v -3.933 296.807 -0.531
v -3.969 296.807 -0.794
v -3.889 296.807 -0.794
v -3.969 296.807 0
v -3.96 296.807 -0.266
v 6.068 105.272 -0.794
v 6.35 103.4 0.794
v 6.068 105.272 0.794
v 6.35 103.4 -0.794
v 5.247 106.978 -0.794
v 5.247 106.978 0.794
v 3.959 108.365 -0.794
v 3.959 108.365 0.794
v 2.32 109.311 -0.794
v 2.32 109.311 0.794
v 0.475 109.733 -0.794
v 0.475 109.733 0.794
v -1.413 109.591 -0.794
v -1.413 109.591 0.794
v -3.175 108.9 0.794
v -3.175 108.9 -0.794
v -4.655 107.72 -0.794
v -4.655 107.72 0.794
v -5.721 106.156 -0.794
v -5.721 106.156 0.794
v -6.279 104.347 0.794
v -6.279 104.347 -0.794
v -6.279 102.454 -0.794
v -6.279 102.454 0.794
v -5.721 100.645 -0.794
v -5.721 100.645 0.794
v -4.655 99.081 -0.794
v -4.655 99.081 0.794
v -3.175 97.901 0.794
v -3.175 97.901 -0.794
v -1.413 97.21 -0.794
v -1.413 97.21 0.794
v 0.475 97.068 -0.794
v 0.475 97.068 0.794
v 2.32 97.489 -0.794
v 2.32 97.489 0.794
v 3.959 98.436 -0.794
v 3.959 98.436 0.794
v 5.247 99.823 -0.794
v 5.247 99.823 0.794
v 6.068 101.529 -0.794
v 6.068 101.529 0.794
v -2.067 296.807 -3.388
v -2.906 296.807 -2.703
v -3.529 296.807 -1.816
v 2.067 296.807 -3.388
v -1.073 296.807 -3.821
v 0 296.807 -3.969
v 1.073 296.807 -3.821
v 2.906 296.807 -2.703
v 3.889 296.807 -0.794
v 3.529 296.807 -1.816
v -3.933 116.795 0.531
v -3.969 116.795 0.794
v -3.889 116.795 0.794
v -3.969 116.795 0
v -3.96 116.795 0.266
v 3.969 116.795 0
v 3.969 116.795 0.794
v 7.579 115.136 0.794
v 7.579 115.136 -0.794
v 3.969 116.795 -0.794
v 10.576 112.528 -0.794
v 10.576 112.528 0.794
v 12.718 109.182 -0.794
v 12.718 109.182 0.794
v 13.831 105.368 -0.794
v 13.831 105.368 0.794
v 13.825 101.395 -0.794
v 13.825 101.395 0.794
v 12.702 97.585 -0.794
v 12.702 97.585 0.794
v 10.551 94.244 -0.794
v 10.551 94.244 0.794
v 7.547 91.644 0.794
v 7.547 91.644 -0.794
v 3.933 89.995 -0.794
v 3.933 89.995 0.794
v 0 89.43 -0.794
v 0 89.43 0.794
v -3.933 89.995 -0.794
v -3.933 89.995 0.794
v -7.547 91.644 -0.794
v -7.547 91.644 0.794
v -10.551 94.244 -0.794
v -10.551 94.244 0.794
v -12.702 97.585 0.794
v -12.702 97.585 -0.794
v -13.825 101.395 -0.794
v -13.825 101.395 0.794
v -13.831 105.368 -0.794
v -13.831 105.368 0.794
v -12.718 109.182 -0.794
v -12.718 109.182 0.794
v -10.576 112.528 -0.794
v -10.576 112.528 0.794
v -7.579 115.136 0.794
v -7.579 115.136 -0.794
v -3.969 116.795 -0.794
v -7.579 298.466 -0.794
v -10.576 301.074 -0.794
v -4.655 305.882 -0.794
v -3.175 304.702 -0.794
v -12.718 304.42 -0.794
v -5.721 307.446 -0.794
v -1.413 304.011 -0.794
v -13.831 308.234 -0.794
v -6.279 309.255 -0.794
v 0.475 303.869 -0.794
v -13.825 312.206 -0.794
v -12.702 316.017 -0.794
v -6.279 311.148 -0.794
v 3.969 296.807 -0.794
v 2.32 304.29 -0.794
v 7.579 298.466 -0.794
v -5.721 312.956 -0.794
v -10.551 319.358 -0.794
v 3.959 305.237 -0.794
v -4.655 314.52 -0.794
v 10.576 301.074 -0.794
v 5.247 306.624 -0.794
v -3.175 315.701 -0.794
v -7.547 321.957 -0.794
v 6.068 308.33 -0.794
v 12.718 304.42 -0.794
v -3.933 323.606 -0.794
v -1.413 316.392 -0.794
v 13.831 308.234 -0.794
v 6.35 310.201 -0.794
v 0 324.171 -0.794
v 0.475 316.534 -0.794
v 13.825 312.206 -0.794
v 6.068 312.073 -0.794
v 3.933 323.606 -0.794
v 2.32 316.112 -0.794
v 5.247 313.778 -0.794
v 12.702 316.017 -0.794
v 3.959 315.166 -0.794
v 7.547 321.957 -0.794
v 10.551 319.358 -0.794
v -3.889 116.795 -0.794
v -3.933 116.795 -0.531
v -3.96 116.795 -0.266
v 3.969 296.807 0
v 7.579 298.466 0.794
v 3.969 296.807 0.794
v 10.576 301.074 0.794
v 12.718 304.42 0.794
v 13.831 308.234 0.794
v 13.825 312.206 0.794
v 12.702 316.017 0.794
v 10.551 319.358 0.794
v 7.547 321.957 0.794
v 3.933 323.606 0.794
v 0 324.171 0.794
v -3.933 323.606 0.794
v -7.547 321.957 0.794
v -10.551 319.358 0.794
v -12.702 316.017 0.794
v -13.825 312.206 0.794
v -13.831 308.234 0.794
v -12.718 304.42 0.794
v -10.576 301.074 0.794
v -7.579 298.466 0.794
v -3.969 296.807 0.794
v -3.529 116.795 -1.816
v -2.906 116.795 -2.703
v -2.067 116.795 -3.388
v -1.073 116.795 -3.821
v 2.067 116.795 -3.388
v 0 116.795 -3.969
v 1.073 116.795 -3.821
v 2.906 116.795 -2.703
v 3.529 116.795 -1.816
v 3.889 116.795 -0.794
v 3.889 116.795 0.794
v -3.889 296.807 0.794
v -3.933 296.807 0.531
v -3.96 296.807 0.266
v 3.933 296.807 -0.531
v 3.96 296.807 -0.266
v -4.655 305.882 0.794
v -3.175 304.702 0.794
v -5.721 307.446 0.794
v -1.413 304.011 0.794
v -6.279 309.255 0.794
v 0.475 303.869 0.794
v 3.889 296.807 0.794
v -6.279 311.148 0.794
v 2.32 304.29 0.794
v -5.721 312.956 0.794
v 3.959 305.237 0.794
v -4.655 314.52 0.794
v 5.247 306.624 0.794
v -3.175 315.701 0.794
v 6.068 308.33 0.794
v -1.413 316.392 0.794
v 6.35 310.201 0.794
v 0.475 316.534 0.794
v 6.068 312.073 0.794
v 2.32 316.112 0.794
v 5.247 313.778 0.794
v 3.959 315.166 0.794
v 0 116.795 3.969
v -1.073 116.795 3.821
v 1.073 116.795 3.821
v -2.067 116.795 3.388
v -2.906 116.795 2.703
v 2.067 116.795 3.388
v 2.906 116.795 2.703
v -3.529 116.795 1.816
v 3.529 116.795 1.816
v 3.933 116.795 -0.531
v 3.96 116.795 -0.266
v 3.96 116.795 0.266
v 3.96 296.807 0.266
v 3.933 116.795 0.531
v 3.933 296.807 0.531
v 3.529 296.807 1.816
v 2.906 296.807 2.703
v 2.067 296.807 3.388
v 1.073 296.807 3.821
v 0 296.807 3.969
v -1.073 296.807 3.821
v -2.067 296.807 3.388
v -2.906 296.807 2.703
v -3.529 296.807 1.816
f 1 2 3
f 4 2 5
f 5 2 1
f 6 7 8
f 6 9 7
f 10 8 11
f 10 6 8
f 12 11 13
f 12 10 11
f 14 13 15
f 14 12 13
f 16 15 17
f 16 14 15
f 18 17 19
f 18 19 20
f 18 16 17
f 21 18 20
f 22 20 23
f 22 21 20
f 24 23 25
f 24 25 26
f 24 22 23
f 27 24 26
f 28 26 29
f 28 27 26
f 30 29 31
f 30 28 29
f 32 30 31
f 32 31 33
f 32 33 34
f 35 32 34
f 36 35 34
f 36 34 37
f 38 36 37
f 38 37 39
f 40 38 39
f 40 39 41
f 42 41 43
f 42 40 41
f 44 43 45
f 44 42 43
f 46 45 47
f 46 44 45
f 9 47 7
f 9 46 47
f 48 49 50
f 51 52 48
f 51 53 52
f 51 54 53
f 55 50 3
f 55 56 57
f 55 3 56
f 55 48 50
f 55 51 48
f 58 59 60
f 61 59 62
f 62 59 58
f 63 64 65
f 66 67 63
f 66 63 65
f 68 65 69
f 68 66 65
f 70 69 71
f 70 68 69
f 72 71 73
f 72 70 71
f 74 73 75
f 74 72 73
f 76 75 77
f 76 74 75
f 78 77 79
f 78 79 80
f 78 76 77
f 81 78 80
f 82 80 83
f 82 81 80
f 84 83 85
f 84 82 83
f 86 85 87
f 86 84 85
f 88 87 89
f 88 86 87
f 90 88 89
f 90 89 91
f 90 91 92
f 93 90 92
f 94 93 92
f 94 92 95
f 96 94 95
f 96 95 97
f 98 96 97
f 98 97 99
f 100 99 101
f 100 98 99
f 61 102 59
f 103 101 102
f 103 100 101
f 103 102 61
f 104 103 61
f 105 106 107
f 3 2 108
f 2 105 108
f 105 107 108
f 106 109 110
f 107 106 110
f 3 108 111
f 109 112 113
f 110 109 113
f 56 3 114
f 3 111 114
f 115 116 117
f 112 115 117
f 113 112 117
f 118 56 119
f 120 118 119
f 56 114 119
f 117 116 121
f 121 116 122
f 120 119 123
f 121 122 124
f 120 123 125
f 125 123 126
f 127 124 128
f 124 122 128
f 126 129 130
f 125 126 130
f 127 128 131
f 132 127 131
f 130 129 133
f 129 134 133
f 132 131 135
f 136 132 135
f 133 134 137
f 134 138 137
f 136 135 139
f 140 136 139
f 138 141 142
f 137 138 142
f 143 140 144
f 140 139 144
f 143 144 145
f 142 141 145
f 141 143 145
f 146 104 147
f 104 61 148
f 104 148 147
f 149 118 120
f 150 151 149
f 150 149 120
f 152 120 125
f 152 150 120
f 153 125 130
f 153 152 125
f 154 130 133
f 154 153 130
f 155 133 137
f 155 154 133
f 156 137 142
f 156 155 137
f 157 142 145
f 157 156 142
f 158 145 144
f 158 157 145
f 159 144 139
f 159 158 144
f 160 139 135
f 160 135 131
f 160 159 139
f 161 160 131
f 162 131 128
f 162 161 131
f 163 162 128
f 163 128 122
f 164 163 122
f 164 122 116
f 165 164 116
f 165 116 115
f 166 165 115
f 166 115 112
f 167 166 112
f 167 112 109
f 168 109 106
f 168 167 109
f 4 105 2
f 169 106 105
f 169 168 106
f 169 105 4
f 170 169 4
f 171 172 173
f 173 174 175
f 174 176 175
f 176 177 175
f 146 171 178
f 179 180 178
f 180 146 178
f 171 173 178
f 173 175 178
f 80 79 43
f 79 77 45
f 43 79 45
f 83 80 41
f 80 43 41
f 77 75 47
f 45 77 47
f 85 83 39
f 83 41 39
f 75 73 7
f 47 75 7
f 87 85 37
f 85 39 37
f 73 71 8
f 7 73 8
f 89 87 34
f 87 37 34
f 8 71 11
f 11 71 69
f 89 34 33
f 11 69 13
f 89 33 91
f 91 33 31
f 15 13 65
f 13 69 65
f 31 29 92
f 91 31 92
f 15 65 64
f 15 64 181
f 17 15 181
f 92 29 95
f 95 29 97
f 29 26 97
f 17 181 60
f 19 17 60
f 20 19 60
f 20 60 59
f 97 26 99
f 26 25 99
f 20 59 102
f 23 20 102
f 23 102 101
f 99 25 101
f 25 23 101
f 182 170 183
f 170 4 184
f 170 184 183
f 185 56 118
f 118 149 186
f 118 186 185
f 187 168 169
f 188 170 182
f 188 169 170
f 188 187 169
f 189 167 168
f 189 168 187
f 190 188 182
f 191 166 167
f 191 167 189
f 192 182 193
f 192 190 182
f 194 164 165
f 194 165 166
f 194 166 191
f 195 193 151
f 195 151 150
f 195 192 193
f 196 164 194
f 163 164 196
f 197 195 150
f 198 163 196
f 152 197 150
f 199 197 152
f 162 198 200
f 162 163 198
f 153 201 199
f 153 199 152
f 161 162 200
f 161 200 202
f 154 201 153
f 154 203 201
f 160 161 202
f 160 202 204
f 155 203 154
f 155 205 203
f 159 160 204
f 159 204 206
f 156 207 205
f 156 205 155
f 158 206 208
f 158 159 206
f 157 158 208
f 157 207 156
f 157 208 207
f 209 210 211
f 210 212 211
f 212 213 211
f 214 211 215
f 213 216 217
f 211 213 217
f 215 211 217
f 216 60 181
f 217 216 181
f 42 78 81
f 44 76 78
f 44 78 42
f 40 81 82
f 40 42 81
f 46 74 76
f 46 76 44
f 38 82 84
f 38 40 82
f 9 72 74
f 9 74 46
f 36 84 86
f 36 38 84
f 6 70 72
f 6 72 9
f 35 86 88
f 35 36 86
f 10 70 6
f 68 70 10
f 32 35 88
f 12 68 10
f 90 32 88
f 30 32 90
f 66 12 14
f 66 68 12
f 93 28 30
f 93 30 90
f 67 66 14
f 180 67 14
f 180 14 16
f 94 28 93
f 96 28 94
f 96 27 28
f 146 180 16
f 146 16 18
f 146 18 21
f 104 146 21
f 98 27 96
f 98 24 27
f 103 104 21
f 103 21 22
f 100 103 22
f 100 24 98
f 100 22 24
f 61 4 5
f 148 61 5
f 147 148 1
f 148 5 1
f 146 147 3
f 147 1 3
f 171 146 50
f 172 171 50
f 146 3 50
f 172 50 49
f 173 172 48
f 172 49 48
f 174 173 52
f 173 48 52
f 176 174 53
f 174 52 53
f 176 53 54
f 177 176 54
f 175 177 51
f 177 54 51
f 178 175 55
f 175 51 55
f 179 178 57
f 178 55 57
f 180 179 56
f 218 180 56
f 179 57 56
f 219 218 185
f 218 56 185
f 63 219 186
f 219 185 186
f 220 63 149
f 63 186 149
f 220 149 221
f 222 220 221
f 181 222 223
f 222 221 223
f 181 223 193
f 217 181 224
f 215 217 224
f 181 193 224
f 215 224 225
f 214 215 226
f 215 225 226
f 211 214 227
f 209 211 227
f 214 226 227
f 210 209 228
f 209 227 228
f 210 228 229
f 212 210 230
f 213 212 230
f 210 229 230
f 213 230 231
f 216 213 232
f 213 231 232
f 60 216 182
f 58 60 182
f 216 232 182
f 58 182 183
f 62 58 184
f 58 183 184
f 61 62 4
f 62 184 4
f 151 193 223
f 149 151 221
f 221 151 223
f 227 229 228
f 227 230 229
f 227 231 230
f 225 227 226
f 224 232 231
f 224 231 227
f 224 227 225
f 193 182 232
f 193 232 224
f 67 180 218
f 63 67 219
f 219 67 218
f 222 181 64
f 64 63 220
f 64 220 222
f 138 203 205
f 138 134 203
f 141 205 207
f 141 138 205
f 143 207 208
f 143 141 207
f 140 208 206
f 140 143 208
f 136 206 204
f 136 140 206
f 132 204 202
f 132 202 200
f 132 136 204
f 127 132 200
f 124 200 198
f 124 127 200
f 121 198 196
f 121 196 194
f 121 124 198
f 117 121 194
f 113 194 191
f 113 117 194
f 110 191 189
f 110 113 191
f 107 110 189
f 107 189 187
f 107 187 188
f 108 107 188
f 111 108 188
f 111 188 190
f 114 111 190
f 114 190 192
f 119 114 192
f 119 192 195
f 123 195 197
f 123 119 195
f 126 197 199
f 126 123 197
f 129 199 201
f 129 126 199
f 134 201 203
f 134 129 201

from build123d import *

# Parameters (mm, degrees)
SKETCH1_W           = 7.9375
SKETCH1_H           = 360.02418597
SKETCH1_3_R         = 12.7
BOSS_EXTRUDE1_DEPTH = 1.5875
SCALE1_SCALE        = 0.5


with BuildPart() as part:
    # Sketch1 → Revolve1 (revolve)
    with BuildSketch(Plane.XY):
        with Locations((3.96875, 206.8008909)):
            Rectangle(SKETCH1_W, SKETCH1_H)
    revolve(axis=Axis((0, 386.812983885, 0), (0, -1, 0)))

    # Sketch1<3> → Boss-Extrude1 (add, symmetric)
    # profile 1 of 2: a face of its own
    with BuildSketch(Plane.XY):
        with BuildLine():
            Line((-7.9375, 386.812983885), (7.9375, 386.812983885))
            ThreePointArc((7.9375, 386.812983885), (0, 441.541781801), (-7.9375, 386.812983885))
        make_face()
        with Locations((0, 413.601781801)):
            Circle(SKETCH1_3_R, mode=Mode.SUBTRACT)
    # profile 2 of 2: a face of its own
    with BuildSketch(Plane.XY):
        with BuildLine():
            Line((7.9375, 26.788797915), (-7.9375, 26.788797915))
            ThreePointArc((-7.9375, 26.788797915), (0, -27.94), (7.9375, 26.788797915))
        make_face()
        Circle(SKETCH1_3_R, mode=Mode.SUBTRACT)
    extrude(amount=BOSS_EXTRUDE1_DEPTH, both=True)


with BuildPart() as part_1:
    # Scale1: scaled about (0, 206.8008909, 0)
    add(part.part.scale(SCALE1_SCALE).moved(Location((0, 103.40044545, 0))))


solid = part_1.part
